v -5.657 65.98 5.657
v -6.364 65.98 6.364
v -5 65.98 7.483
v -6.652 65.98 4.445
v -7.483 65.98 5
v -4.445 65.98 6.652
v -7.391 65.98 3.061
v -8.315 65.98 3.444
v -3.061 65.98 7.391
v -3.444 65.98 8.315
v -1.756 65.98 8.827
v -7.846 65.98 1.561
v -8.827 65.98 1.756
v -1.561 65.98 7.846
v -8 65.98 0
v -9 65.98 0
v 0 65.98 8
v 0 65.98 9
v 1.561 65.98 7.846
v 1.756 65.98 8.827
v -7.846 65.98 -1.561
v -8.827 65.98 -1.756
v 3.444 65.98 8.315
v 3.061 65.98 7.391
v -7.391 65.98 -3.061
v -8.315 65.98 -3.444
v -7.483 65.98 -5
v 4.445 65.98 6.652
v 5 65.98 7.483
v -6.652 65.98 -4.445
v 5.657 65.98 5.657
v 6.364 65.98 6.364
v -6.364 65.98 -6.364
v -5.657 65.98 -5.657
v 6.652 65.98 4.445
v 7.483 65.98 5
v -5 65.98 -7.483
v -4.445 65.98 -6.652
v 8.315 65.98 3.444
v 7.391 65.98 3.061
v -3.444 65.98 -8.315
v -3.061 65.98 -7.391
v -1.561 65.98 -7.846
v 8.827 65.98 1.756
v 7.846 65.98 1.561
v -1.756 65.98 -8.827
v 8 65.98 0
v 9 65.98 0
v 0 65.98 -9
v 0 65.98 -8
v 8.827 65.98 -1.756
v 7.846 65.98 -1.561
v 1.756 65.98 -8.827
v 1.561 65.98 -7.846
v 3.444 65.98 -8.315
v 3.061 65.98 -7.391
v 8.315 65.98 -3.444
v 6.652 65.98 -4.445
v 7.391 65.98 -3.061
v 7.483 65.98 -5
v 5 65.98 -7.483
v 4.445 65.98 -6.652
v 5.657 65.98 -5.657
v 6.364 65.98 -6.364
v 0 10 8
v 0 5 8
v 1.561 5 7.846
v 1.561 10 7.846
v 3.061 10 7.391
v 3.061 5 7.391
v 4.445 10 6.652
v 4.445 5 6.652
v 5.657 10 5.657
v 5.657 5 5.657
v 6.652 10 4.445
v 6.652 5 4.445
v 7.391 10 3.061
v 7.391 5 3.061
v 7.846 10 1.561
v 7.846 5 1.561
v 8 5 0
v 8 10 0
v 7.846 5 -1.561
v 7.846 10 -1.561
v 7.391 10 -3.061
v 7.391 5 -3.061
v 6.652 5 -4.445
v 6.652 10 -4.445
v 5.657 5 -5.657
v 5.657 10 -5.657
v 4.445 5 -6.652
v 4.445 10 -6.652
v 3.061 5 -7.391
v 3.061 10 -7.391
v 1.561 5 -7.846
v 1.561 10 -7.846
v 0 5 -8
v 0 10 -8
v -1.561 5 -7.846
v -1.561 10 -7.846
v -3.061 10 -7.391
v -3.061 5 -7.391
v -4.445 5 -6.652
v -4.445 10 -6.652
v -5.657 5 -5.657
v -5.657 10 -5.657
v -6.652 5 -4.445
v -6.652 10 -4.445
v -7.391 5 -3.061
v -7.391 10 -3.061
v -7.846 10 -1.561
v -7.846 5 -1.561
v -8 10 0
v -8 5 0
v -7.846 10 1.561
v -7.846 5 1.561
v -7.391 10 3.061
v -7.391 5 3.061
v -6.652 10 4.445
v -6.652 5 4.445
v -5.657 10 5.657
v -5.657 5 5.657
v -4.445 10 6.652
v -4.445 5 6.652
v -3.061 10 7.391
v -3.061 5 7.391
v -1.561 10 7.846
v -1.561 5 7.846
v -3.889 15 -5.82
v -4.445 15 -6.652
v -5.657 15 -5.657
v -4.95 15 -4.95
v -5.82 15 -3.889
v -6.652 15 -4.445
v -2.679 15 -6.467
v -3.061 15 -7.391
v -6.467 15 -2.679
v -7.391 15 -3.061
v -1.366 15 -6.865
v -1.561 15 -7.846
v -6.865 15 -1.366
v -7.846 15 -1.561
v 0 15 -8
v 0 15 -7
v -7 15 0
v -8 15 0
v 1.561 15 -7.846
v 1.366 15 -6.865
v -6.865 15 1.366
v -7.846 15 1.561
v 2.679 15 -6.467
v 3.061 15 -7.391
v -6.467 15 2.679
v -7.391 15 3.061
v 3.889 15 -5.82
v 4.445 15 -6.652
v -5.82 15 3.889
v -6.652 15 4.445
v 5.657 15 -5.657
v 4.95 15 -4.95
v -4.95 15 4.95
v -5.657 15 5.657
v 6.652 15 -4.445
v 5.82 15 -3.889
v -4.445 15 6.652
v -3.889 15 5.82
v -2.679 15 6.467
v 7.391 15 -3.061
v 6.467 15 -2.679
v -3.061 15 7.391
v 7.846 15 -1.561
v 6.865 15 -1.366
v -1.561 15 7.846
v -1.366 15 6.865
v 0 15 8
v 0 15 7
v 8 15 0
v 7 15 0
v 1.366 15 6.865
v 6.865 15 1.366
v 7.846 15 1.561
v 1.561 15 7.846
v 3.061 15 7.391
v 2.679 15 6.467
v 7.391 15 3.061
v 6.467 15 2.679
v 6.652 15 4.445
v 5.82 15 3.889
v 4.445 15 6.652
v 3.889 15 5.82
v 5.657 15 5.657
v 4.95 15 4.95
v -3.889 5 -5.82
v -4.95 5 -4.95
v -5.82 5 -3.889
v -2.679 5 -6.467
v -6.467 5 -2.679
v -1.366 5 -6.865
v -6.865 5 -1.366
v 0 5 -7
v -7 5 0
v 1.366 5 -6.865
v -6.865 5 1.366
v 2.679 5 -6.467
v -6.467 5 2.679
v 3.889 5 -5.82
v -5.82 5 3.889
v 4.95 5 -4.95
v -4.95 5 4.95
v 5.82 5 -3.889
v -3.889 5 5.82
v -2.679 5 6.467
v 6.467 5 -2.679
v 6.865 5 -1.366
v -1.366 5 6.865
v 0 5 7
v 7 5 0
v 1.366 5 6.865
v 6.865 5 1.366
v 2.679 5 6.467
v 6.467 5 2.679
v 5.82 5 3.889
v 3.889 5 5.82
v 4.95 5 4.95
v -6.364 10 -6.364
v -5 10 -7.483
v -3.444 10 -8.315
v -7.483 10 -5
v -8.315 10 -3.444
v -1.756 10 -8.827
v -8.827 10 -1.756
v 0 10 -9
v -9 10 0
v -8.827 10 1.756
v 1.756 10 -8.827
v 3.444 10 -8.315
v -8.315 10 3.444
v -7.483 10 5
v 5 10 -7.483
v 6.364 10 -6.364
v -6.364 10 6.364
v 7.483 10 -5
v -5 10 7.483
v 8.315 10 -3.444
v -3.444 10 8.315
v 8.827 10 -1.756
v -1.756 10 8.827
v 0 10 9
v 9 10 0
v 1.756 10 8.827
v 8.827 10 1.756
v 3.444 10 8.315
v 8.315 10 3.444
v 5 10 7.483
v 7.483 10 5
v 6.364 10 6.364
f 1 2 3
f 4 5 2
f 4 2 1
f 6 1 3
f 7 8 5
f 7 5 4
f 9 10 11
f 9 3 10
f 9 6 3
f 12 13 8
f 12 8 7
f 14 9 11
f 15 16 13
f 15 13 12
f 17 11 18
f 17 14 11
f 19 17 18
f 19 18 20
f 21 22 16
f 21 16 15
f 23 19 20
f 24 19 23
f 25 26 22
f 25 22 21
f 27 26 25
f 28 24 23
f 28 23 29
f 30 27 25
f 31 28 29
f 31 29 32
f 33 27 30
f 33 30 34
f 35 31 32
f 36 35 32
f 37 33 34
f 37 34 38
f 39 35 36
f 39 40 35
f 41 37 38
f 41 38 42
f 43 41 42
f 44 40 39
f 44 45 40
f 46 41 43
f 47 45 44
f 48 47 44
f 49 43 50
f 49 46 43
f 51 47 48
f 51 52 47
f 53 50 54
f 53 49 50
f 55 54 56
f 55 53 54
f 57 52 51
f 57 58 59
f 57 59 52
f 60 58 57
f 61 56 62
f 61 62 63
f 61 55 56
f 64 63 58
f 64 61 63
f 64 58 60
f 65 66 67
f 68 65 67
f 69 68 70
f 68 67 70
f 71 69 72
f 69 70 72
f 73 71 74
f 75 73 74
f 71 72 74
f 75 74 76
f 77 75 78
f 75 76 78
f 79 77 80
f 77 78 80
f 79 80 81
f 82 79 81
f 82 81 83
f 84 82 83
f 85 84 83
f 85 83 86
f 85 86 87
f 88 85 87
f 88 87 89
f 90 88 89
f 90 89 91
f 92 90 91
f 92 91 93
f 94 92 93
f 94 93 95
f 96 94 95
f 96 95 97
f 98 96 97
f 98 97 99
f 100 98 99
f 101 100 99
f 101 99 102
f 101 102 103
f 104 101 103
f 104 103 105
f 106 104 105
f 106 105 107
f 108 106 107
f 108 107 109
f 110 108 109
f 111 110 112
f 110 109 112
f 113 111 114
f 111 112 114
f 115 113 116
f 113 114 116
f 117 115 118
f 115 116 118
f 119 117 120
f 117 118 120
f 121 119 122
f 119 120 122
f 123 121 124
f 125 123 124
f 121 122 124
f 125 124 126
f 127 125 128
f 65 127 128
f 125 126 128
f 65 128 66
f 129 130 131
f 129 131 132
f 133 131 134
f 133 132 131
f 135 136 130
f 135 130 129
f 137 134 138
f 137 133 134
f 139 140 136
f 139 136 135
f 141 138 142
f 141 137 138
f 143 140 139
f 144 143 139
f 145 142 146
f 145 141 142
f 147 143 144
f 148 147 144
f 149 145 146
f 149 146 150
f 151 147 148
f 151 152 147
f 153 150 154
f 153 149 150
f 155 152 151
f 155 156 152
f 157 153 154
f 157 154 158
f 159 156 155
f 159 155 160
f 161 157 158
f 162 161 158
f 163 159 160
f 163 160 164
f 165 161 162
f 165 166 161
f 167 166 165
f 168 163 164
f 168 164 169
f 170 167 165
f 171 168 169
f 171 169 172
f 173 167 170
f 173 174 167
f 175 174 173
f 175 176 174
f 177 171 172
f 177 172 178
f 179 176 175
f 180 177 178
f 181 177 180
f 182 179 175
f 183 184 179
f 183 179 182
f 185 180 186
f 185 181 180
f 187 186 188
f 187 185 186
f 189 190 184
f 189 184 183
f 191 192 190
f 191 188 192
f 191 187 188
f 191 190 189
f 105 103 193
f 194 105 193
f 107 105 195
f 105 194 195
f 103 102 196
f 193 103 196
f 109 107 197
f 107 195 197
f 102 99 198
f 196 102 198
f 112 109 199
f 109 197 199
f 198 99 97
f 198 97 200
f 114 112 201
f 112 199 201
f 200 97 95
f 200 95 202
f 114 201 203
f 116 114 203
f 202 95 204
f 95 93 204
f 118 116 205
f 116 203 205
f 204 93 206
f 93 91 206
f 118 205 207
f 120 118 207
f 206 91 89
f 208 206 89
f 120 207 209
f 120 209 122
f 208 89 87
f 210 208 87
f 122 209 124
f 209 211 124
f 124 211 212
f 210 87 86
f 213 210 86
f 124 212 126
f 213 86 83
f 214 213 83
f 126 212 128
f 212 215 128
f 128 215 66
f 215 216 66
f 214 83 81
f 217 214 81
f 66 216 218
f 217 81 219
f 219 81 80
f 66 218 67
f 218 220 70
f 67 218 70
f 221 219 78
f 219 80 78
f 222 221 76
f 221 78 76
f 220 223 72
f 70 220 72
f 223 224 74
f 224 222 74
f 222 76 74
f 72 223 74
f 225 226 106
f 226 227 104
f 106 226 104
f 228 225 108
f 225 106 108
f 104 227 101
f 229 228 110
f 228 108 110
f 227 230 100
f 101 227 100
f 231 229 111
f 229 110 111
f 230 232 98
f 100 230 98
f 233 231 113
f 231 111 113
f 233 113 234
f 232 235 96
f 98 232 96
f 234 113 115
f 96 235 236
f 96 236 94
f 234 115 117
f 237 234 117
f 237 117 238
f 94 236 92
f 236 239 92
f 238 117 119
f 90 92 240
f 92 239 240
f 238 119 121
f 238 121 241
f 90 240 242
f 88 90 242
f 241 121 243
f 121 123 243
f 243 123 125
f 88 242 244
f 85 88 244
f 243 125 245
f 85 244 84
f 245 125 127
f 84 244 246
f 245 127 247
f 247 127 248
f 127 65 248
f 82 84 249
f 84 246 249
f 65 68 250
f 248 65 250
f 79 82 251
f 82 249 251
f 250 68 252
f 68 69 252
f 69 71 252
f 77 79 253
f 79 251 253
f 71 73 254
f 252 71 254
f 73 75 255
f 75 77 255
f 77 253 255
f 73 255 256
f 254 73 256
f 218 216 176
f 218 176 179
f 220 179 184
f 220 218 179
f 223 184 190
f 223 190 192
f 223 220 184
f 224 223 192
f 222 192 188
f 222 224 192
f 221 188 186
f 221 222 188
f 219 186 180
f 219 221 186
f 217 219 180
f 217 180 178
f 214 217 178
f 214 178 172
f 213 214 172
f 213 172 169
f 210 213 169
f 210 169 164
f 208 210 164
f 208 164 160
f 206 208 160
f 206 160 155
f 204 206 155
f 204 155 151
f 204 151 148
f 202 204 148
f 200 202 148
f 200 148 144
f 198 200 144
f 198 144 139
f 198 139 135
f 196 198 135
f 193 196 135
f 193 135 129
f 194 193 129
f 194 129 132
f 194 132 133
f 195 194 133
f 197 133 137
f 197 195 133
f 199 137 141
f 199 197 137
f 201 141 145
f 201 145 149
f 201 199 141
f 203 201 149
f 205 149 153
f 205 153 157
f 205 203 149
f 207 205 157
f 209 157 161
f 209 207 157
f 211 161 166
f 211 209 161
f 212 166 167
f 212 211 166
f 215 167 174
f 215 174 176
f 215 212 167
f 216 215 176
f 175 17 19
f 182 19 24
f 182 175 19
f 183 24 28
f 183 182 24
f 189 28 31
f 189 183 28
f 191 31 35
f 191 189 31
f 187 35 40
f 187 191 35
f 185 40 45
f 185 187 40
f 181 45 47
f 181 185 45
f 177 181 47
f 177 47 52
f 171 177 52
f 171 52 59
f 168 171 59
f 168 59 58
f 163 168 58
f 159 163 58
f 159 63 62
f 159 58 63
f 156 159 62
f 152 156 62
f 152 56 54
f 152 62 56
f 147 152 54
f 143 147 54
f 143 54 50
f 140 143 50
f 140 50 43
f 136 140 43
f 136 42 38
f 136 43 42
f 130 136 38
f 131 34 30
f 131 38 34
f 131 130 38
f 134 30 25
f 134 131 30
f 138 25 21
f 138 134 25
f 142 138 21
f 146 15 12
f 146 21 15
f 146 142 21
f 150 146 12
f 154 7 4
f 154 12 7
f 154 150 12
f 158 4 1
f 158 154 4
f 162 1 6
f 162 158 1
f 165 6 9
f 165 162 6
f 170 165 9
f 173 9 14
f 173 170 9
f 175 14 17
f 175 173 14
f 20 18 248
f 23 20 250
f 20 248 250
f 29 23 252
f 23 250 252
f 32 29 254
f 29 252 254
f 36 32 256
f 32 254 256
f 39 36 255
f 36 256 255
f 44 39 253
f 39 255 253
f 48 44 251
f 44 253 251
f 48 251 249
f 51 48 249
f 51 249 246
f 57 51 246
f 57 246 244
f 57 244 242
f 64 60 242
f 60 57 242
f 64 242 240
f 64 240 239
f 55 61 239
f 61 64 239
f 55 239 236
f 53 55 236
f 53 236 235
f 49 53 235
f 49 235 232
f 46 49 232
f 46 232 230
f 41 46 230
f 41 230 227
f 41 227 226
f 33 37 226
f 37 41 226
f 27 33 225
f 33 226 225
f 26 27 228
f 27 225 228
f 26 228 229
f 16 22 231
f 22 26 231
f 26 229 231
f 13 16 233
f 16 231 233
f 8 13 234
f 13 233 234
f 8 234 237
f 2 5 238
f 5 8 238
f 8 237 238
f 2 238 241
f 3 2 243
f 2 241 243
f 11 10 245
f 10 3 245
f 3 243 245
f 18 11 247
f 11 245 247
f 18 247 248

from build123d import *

# Parameters (mm, degrees)
SKETCH1_R               = 8
SKETCH1_R_2             = 7
BOSS_EXTRUDE1_DEPTH     = 15
SKETCH2_R               = 9
SKETCH2_R_2             = 8
BOSS_EXTRUDE2_DEPTH     = 120
SKETCH3_R               = 8
SKETCH3_R_2             = 7
CUT_EXTRUDE1_DEPTH      = 5
CUT_EXTRUDE2_DEPTH      = 31
CUT_EXTRUDE2_DEPTH_BACK = 31
SKETCH4_W               = 18
SKETCH4_H               = 40.940584593
CUT_EXTRUDE3_DEPTH      = 31
CUT_EXTRUDE3_DEPTH_BACK = 31
SKETCH5_W               = 18
SKETCH5_H               = 23.079337433


with BuildPart() as part:
    # Sketch1 → Boss-Extrude1 (new body)
    with BuildSketch(Plane(origin=(0, 0, 0), x_dir=(1, 0, 0), z_dir=(0, 1, 0))):
        Circle(SKETCH1_R)
        Circle(SKETCH1_R_2, mode=Mode.SUBTRACT)
    extrude(amount=BOSS_EXTRUDE1_DEPTH)

    # Sketch2 → Boss-Extrude2 (add)
    with BuildSketch(Plane(origin=(0, 10, 0), x_dir=(1, 0, 0), z_dir=(0, 1, 0))):
        Circle(SKETCH2_R)
        Circle(SKETCH2_R_2, mode=Mode.SUBTRACT)
    extrude(amount=BOSS_EXTRUDE2_DEPTH)

    # Sketch3 → Cut-Extrude1 (cut)
    with BuildSketch(Plane(origin=(0, 0, 0), x_dir=(1, 0, 0), z_dir=(0, 1, 0))):
        Circle(SKETCH3_R)
        Circle(SKETCH3_R_2, mode=Mode.SUBTRACT)
    extrude(amount=CUT_EXTRUDE1_DEPTH, mode=Mode.SUBTRACT)

    # Sketch4 → Cut-Extrude2 (cut, two sides: drawn at the far end of the back side and taken through both)
    with BuildSketch(Plane.XY.offset(-CUT_EXTRUDE2_DEPTH_BACK)):
        with Locations((0, 109.529707704)):
            Rectangle(SKETCH4_W, SKETCH4_H)
    extrude(amount=CUT_EXTRUDE2_DEPTH + CUT_EXTRUDE2_DEPTH_BACK, mode=Mode.SUBTRACT)

    # Sketch5 → Cut-Extrude3 (cut, two sides: drawn at the far end of the back side and taken through both)
    with BuildSketch(Plane.XY.offset(-CUT_EXTRUDE3_DEPTH_BACK)):
        with Locations((0, 77.51974669)):
            Rectangle(SKETCH5_W, SKETCH5_H)
    extrude(amount=CUT_EXTRUDE3_DEPTH + CUT_EXTRUDE3_DEPTH_BACK, mode=Mode.SUBTRACT)


solid = part.part
